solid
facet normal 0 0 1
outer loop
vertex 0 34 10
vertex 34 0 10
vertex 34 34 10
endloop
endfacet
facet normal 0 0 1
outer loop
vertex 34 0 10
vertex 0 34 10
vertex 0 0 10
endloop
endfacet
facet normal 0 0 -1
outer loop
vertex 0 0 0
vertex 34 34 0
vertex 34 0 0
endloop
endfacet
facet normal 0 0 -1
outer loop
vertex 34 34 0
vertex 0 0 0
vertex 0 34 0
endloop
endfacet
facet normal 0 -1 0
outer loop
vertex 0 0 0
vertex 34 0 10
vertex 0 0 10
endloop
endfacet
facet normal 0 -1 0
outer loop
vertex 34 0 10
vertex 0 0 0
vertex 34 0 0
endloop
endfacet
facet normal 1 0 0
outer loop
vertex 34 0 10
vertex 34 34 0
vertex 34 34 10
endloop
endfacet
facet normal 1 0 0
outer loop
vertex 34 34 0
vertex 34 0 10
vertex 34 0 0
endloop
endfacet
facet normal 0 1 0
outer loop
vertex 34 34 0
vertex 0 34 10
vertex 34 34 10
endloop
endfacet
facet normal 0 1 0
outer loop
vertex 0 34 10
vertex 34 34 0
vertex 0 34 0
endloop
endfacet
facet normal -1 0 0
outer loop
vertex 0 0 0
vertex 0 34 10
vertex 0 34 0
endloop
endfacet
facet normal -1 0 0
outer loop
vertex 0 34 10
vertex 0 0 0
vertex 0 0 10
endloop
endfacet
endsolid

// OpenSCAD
widthPlexi = 34;
height = 10;

cube([widthPlexi,widthPlexi,height]); 
